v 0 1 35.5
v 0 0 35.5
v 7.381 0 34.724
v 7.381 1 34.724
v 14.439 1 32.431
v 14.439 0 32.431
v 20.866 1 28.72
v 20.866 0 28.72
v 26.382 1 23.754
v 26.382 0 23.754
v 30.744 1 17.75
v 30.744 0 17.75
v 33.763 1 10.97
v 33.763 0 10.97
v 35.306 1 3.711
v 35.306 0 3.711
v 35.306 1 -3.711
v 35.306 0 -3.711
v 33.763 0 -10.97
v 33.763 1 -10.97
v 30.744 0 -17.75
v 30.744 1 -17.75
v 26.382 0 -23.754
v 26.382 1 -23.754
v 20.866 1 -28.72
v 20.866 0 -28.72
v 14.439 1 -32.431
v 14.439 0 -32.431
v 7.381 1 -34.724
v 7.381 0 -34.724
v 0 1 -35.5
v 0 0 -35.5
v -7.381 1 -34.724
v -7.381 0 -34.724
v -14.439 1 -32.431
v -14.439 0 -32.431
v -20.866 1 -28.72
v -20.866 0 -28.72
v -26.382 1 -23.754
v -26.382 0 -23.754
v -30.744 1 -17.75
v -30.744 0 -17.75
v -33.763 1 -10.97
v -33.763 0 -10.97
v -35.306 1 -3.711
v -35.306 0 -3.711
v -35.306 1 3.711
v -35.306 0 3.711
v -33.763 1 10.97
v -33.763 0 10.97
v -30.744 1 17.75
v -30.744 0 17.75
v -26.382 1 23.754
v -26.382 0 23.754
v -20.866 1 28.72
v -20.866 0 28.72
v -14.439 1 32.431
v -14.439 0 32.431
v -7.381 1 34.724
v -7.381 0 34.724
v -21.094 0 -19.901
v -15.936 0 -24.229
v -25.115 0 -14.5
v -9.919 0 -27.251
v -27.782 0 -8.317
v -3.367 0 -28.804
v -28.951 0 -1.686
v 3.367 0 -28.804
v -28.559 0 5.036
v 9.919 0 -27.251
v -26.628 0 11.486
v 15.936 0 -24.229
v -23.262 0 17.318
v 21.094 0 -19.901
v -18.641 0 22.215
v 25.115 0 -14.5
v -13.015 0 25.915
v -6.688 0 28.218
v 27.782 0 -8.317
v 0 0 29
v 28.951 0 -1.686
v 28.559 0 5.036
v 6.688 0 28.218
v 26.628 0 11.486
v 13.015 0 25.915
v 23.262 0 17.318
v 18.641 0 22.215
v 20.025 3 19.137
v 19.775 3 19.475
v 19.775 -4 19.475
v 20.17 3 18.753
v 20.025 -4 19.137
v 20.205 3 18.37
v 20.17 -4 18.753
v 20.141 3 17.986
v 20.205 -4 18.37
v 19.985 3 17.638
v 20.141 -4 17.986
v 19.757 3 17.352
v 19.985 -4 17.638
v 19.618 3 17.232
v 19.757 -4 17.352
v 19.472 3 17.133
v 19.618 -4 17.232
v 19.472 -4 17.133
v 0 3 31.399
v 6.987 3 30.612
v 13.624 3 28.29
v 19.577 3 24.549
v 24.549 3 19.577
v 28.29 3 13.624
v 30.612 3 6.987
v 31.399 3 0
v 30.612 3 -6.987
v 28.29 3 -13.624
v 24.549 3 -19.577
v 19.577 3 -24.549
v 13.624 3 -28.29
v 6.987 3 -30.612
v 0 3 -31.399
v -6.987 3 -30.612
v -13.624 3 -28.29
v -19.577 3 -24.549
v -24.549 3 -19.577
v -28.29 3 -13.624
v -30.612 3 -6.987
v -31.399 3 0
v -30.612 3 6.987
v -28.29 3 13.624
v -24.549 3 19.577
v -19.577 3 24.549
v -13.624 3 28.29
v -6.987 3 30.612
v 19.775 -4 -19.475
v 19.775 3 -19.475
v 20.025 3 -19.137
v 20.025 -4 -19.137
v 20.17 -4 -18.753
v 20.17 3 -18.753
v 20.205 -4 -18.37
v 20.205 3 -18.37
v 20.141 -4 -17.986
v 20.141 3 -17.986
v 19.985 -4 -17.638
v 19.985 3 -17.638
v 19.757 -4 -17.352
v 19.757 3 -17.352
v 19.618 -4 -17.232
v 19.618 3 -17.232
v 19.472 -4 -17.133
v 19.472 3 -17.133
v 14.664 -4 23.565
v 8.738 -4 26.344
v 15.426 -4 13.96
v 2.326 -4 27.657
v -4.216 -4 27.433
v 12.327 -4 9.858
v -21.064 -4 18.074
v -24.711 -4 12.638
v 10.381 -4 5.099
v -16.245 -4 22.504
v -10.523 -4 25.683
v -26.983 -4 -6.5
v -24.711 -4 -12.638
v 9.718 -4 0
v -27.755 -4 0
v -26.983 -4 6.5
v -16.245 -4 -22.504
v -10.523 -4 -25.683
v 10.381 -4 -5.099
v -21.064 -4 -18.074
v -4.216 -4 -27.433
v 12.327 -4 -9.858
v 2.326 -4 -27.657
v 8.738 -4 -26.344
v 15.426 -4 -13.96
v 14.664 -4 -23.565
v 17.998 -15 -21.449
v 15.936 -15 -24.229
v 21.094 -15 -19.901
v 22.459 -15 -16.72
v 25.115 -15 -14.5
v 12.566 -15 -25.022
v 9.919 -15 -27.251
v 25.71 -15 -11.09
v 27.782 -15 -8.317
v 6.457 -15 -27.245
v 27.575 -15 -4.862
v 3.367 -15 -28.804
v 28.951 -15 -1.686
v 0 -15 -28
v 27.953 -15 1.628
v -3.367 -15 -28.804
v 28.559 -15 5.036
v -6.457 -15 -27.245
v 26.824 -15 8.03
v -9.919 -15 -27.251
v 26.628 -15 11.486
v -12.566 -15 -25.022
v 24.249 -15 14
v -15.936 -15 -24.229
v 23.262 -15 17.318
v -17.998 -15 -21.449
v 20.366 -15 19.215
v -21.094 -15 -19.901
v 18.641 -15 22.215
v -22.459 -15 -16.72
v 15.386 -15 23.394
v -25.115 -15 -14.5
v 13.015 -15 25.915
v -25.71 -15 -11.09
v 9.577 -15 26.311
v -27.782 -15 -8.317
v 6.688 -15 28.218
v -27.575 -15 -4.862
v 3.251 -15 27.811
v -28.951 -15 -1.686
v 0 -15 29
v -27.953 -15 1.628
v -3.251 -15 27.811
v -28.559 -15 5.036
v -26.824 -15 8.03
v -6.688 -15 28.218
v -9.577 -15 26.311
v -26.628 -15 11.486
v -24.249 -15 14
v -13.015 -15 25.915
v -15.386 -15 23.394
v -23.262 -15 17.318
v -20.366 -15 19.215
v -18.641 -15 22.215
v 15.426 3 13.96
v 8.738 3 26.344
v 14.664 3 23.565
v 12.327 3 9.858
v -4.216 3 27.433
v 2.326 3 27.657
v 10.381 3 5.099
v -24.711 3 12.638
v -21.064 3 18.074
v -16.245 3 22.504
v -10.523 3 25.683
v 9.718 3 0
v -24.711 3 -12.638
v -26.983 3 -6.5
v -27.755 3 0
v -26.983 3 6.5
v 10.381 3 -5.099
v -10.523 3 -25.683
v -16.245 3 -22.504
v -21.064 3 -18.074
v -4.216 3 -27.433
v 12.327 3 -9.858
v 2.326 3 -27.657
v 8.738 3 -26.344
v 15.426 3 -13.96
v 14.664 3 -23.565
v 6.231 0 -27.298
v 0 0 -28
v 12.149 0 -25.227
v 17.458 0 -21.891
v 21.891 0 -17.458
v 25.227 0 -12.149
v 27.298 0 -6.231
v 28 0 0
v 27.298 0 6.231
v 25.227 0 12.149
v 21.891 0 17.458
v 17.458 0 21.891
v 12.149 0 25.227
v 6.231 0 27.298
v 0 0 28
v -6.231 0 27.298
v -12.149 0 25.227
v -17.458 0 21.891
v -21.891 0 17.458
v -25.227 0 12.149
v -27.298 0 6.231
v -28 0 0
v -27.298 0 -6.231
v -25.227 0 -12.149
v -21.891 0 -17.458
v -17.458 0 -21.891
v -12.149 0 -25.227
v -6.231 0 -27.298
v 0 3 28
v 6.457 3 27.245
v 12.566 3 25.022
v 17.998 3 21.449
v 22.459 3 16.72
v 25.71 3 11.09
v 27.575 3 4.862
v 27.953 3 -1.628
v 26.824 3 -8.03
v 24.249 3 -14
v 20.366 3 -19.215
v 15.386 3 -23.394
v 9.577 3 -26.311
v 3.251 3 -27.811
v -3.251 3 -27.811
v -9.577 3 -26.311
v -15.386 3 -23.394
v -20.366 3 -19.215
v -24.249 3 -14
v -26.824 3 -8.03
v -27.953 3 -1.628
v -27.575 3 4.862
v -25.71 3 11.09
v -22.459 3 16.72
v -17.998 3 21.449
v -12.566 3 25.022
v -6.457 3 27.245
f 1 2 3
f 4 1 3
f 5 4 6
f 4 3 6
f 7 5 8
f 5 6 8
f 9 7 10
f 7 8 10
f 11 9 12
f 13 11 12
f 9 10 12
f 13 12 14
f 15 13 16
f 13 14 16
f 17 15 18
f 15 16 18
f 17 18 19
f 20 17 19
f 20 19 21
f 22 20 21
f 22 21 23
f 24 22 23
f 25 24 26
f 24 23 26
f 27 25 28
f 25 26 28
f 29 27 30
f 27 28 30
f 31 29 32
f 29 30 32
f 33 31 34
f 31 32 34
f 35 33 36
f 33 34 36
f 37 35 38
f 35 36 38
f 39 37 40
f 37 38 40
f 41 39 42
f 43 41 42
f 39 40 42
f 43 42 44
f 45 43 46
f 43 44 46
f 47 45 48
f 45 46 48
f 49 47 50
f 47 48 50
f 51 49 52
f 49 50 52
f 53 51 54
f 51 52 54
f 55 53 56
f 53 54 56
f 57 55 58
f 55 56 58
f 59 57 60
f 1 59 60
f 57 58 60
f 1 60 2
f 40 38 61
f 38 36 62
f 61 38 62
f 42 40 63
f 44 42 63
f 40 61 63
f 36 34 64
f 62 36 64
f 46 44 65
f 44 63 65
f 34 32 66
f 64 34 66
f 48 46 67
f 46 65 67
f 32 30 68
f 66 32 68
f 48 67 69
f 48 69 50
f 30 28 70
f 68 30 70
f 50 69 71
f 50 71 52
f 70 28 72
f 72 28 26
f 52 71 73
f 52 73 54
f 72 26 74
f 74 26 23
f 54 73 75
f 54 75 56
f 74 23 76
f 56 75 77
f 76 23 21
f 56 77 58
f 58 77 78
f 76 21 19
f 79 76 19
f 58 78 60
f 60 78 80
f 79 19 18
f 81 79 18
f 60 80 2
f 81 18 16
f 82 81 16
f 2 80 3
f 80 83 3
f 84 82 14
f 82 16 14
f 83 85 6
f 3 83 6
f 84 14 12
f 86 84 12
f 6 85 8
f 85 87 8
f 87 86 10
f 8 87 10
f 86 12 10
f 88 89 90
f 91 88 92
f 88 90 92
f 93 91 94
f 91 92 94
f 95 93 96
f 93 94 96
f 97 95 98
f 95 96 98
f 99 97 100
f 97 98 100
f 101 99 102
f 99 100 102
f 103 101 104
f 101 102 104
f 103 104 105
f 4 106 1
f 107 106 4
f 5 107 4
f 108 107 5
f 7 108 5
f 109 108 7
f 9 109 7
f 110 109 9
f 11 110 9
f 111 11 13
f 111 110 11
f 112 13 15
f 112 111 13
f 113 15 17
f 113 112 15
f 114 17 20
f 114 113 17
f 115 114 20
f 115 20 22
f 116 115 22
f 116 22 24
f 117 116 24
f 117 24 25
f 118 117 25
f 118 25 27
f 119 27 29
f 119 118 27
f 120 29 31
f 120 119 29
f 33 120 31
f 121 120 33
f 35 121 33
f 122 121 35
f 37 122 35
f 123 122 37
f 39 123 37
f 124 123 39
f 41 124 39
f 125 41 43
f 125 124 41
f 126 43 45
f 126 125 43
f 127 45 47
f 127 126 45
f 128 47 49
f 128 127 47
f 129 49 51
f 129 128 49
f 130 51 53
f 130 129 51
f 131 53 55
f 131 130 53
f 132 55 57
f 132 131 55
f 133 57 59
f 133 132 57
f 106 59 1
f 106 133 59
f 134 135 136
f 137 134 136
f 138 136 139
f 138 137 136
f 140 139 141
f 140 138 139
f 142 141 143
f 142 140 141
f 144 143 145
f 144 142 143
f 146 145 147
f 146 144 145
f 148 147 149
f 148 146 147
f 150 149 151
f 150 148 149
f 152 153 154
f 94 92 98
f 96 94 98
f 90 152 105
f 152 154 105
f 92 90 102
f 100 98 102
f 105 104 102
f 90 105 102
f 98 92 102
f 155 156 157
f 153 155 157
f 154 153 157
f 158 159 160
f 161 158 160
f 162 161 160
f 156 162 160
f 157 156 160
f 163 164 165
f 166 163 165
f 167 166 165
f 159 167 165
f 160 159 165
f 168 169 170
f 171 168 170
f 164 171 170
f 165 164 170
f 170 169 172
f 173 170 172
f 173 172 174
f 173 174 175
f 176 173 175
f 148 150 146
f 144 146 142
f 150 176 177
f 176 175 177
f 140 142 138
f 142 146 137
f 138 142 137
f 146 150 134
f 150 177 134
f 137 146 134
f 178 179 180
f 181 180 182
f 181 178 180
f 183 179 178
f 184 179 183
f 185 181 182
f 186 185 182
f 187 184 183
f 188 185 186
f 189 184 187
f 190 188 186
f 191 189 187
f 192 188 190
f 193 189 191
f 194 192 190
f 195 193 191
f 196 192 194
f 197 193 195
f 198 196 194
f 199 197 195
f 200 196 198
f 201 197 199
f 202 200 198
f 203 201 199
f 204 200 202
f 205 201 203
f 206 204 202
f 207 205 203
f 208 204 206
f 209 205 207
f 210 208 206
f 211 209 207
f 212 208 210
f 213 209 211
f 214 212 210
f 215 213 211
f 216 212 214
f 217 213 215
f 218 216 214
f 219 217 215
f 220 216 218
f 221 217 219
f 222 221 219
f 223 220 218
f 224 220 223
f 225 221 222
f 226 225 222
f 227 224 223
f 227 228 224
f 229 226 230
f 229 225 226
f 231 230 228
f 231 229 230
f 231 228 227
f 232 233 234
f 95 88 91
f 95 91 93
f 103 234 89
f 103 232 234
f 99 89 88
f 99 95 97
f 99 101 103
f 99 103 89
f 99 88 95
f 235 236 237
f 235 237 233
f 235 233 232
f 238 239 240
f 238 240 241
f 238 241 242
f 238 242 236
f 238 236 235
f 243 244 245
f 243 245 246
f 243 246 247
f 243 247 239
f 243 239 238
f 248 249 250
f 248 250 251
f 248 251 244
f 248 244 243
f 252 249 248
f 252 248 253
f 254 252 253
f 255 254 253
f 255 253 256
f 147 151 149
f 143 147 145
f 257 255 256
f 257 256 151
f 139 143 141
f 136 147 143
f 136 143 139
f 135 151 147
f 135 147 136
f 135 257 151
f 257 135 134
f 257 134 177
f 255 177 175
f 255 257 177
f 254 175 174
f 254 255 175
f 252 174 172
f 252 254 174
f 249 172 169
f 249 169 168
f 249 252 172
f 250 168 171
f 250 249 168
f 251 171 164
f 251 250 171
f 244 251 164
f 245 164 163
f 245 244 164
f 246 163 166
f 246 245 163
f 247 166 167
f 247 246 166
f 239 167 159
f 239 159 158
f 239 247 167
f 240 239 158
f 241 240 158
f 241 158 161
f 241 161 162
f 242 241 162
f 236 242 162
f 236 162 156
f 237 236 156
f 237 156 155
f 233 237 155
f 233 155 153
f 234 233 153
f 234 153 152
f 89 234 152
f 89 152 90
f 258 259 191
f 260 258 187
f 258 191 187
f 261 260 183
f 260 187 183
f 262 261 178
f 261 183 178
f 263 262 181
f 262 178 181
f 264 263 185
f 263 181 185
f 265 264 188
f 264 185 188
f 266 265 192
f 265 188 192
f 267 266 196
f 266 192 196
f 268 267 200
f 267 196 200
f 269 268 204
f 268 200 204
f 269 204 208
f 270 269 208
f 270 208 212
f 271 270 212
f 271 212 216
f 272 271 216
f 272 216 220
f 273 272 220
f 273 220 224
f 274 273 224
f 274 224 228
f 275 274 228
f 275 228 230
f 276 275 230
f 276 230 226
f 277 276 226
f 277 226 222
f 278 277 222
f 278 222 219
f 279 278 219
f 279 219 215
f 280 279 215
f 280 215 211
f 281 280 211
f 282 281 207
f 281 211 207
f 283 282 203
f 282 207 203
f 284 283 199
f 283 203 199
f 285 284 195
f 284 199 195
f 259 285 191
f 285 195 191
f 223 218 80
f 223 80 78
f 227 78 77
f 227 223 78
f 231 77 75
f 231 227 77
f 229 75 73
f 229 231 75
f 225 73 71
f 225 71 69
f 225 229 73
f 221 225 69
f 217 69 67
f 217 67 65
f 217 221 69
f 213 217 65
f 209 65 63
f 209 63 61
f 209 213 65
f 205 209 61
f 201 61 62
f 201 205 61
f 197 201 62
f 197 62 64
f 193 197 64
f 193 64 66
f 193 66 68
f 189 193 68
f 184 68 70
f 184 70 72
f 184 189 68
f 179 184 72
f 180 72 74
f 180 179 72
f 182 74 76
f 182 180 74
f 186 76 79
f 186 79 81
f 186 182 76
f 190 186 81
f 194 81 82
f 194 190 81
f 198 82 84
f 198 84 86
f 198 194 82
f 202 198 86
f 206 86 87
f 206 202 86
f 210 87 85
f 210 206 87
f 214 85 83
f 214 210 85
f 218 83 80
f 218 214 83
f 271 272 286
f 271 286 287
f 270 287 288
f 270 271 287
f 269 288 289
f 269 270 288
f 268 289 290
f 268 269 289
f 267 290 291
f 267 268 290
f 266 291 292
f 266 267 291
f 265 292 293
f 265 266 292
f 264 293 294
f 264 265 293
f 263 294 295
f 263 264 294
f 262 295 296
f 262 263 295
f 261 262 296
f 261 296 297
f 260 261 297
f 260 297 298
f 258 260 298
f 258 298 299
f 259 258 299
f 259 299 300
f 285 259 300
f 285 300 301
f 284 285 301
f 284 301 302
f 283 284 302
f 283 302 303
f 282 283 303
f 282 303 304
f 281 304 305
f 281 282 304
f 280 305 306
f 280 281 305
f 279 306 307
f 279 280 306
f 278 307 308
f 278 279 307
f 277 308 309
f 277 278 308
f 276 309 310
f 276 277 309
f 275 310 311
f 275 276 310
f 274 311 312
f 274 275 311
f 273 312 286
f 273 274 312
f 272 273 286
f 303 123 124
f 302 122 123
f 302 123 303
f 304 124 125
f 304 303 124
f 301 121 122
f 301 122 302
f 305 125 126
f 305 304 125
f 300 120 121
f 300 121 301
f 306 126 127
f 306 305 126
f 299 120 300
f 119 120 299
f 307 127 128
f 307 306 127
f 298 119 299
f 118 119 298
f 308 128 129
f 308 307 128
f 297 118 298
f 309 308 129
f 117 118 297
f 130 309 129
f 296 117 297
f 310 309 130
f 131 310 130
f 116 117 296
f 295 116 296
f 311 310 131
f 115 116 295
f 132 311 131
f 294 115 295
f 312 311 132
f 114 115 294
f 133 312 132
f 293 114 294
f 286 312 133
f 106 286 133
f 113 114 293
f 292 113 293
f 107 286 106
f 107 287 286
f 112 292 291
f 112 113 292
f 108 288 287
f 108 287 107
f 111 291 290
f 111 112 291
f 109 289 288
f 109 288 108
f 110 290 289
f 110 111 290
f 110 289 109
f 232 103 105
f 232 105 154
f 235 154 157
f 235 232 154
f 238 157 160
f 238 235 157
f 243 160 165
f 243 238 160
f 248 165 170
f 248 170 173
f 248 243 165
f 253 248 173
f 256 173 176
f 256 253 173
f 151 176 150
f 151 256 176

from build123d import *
from build123d.topology import SkipClean

# Parameters (mm, degrees)
SKETCH_1_R      = 35.5
SKETCH_1_R_2    = 28
EXTRUDE_1_DEPTH = 3
CHAMFER_1_SIZE  = 2
CHAMFER_1_SIZE2 = 4.100607683
EXTRUDE_START   = 15
SKETCH_2_R      = 29
SKETCH_2_R_2    = 28
EXTRUDE_2_DEPTH = 15
EXTRUDE_3_DEPTH = 7
FILLET_1_R      = 1.5


with BuildPart() as part:
    # Эскиз1 → Бобышка-Вытянуть1 (new body)
    with BuildSketch(Plane(origin=(0, 0, 0), x_dir=(1, 0, 0), z_dir=(0, 1, 0))):
        with Locations(Location((0, 0, 0), (0, 0, 270))):
            Circle(SKETCH_1_R)
        with Locations(Location((0, 0, 0), (0, 0, 270))):
            Circle(SKETCH_1_R_2, mode=Mode.SUBTRACT)
    extrude(amount=EXTRUDE_1_DEPTH)

    # Фаска1
    chamfer_1_edges = [part.edges().sort_by_distance(p)[0] for p in [
        (0, 3, -35.5),
    ]]
    chamfer_1_side = [part.faces().sort_by_distance(p)[0] for p in [
        (0, 1.5, -35.5),
    ]]
    chamfer(chamfer_1_edges, length=CHAMFER_1_SIZE, length2=CHAMFER_1_SIZE2, reference=chamfer_1_side[0])

    # Эскиз2 → Бобышка-Вытянуть2 (add)
    with SkipClean():  # the faces are left unmerged after this step: merging them gives an invalid solid
        with BuildSketch(Plane.XZ.offset(EXTRUDE_START)):
            with Locations(Location((0, 0, 0), (0, 0, 90))):
                Circle(SKETCH_2_R)
            with Locations(Location((0, 0, 0), (0, 0, 270))):
                Circle(SKETCH_2_R_2, mode=Mode.SUBTRACT)
        extrude(amount=-EXTRUDE_2_DEPTH)


with BuildPart() as body_2:
    # Эскиз3 → Бобышка-Вытянуть3 (new body)
    with BuildSketch(Plane(origin=(0, 3, 0), x_dir=(1, 0, 0), z_dir=(0, 1, 0))):
        with BuildLine():
            ThreePointArc((21.119202458, 18.008976017), (-27.755070341, 0), (21.119202458, -18.008976017))
            ThreePointArc((21.119202458, -18.008976017), (9.717600244, 0), (21.119202458, 18.008976017))
        make_face()
    extrude(amount=-EXTRUDE_3_DEPTH)

    # Скругление1
    fillet_1_edges = [body_2.edges().sort_by_distance(p)[0] for p in [
        (21.119202458, -0.5, 18.008976017),
        (21.119202458, -0.5, -18.008976017),
    ]]
    fillet(fillet_1_edges, radius=FILLET_1_R)


solid = Compound([part.part, body_2.part])
